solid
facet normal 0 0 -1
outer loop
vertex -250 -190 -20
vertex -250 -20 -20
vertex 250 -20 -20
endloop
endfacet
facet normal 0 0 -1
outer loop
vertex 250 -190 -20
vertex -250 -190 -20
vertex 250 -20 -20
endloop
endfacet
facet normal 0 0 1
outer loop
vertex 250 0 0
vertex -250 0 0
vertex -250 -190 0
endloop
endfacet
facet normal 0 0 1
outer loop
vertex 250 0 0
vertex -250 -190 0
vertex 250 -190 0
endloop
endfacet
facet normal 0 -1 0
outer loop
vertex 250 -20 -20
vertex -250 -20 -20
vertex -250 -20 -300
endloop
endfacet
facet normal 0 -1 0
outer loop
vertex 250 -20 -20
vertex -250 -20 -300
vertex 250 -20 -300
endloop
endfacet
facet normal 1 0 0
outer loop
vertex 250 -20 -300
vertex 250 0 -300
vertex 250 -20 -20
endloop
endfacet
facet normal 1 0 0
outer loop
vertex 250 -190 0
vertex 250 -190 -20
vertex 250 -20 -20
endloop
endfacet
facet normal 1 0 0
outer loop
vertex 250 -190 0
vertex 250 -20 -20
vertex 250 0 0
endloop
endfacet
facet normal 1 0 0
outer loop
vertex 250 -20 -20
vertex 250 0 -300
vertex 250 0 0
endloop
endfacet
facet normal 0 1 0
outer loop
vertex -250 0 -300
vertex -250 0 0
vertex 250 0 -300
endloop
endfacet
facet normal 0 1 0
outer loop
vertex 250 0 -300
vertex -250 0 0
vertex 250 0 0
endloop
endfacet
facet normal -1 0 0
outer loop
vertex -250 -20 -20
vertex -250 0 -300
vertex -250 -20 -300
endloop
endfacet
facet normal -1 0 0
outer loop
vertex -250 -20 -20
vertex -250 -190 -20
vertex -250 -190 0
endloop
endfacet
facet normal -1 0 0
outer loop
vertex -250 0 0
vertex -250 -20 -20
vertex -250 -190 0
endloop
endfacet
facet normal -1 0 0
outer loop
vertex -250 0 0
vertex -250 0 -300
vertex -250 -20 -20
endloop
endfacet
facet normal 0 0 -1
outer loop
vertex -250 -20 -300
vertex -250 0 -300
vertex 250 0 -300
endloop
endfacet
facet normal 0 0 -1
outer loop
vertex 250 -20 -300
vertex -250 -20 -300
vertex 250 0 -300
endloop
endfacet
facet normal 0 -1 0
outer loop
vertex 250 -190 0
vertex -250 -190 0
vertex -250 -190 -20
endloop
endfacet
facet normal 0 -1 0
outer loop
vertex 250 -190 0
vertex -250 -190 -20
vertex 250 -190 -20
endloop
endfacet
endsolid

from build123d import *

# Parameters (mm, degrees)
F0_W     = 500
F0_H     = 190
F1_DEPTH = 20
F2_W     = 500
F2_H     = 300
F3_DEPTH = 20


# Not quite as in the source:
# - the program builds the solid bodies; features that only make, move or delete a surface that nothing else refers to are left out


with BuildPart() as f1:
    # F0 (on Top) → F1 (new body)
    with BuildSketch(Plane.XY):
        with Locations((0, -95)):
            Rectangle(F0_W, F0_H)
    extrude(amount=-F1_DEPTH)

    # F2 (on Front) → F3 (join)
    with BuildSketch(Plane.XZ):
        with Locations((0, -150)):
            Rectangle(F2_W, F2_H)
    extrude(amount=F3_DEPTH)


solid = f1.part
